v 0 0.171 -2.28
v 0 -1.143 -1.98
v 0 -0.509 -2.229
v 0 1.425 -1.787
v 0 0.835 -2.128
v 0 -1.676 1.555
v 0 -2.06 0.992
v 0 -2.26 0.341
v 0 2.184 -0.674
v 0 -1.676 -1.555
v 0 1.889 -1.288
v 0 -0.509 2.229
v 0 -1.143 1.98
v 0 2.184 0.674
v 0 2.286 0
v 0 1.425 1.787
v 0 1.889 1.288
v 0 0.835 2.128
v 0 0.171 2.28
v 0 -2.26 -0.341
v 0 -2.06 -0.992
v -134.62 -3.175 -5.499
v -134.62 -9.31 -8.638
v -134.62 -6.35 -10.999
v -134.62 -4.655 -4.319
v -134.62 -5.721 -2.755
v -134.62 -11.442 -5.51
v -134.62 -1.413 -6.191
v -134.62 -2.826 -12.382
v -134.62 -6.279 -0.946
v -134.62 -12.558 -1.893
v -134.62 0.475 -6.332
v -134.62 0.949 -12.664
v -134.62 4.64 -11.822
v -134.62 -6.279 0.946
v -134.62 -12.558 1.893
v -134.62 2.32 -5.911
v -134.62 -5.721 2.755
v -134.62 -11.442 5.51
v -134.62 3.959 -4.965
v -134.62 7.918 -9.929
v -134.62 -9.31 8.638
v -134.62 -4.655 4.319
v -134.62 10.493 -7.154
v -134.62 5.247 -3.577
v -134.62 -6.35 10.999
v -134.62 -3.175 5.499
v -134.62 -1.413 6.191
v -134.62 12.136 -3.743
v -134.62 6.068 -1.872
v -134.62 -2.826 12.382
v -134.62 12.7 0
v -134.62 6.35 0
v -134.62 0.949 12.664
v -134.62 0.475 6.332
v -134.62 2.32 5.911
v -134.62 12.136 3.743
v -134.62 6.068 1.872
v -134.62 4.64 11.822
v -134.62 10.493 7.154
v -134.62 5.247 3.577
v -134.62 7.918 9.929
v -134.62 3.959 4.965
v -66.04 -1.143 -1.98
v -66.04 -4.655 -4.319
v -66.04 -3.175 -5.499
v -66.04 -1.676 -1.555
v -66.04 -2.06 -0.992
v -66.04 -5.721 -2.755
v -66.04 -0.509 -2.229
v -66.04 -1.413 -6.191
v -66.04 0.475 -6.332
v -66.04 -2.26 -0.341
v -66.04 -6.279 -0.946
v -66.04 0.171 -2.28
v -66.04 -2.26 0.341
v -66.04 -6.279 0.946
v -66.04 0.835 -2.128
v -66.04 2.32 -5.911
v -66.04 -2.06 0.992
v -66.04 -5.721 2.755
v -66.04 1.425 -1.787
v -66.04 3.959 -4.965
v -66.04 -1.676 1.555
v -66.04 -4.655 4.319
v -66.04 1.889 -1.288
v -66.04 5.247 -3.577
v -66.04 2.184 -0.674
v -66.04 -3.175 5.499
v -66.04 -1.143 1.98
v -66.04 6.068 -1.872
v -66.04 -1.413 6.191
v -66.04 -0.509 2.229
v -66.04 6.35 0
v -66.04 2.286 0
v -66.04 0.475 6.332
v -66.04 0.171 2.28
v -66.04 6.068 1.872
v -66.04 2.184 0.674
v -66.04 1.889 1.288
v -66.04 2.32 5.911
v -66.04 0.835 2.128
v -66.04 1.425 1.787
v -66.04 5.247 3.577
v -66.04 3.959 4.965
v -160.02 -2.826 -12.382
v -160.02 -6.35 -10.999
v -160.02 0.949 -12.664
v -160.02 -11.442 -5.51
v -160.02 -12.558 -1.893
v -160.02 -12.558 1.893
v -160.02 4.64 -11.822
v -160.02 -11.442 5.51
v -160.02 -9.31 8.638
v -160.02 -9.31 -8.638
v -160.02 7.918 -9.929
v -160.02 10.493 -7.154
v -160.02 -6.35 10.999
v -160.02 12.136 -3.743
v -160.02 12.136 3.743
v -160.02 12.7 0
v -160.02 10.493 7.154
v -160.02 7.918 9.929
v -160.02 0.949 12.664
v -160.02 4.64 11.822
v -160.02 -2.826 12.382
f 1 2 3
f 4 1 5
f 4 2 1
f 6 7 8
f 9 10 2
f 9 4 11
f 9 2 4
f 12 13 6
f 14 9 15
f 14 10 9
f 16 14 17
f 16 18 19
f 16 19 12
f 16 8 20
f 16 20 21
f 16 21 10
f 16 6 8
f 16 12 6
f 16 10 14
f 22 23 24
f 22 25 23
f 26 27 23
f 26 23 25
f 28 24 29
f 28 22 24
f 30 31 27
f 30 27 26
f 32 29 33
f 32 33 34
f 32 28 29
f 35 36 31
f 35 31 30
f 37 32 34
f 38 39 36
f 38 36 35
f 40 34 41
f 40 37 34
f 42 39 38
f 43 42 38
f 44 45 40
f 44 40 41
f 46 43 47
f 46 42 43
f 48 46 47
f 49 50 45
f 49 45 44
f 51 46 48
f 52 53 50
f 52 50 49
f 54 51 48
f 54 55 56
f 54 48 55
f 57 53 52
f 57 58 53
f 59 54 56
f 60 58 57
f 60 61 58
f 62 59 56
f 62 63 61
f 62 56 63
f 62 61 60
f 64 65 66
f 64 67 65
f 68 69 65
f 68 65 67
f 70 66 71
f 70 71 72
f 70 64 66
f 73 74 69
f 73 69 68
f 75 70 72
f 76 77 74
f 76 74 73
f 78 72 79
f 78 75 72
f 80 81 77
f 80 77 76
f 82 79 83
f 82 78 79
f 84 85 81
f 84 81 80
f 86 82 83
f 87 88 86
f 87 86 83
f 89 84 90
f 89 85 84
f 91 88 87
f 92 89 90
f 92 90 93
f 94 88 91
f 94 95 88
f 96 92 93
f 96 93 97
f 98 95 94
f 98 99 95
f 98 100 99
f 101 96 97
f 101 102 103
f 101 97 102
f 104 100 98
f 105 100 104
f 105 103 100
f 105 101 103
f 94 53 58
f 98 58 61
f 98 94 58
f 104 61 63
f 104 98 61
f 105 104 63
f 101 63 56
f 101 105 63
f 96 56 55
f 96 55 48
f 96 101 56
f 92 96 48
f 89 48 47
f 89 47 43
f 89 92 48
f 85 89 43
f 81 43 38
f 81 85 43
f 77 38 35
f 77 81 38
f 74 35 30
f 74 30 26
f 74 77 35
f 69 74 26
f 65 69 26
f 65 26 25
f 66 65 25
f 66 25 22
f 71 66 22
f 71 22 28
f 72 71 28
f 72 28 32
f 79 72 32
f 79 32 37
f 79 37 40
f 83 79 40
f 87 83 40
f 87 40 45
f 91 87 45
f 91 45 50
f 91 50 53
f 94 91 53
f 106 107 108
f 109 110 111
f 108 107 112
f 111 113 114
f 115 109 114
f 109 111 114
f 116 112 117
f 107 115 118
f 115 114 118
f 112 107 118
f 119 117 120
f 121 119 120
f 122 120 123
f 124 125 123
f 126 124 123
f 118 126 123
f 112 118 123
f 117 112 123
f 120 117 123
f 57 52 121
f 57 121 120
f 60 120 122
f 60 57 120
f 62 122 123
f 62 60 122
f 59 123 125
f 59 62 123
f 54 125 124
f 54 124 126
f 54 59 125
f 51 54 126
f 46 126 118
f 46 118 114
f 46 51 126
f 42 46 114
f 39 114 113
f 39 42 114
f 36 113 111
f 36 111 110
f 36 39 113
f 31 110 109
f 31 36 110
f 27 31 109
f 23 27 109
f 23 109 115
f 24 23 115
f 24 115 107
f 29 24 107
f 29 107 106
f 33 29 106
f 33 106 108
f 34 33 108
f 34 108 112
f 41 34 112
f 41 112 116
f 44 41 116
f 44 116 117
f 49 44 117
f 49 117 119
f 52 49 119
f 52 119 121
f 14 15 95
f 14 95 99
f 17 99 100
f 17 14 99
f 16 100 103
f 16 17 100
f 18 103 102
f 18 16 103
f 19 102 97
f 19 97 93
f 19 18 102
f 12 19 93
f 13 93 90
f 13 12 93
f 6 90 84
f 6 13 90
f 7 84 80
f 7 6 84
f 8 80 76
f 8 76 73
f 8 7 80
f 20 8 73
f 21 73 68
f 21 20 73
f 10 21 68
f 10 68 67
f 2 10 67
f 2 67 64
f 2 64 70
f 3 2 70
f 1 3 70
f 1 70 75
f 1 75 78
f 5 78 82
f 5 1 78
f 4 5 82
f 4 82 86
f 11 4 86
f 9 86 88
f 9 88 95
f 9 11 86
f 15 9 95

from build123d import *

# Parameters (mm, degrees)
F0_R     = 12.7
F1_DEPTH = 160.02
F2_R     = 12.7
F2_R_2   = 6.35
F3_DEPTH = 134.62
F4_R     = 6.35
F4_R_2   = 2.286
F5_DEPTH = 66.04


with BuildPart() as f1:
    # F0 (on Right) → F1 (new body)
    with BuildSketch(Plane.YZ):
        Circle(F0_R)
    extrude(amount=-F1_DEPTH)

    # F2 (on face) → F3 (cut)
    with BuildSketch(Plane.YZ):
        Circle(F2_R)
        Circle(F2_R_2, mode=Mode.SUBTRACT)
    extrude(amount=-F3_DEPTH, mode=Mode.SUBTRACT)

    # F4 (on face) → F5 (cut)
    with BuildSketch(Plane.YZ):
        Circle(F4_R)
        Circle(F4_R_2, mode=Mode.SUBTRACT)
    extrude(amount=-F5_DEPTH, mode=Mode.SUBTRACT)


solid = f1.part
